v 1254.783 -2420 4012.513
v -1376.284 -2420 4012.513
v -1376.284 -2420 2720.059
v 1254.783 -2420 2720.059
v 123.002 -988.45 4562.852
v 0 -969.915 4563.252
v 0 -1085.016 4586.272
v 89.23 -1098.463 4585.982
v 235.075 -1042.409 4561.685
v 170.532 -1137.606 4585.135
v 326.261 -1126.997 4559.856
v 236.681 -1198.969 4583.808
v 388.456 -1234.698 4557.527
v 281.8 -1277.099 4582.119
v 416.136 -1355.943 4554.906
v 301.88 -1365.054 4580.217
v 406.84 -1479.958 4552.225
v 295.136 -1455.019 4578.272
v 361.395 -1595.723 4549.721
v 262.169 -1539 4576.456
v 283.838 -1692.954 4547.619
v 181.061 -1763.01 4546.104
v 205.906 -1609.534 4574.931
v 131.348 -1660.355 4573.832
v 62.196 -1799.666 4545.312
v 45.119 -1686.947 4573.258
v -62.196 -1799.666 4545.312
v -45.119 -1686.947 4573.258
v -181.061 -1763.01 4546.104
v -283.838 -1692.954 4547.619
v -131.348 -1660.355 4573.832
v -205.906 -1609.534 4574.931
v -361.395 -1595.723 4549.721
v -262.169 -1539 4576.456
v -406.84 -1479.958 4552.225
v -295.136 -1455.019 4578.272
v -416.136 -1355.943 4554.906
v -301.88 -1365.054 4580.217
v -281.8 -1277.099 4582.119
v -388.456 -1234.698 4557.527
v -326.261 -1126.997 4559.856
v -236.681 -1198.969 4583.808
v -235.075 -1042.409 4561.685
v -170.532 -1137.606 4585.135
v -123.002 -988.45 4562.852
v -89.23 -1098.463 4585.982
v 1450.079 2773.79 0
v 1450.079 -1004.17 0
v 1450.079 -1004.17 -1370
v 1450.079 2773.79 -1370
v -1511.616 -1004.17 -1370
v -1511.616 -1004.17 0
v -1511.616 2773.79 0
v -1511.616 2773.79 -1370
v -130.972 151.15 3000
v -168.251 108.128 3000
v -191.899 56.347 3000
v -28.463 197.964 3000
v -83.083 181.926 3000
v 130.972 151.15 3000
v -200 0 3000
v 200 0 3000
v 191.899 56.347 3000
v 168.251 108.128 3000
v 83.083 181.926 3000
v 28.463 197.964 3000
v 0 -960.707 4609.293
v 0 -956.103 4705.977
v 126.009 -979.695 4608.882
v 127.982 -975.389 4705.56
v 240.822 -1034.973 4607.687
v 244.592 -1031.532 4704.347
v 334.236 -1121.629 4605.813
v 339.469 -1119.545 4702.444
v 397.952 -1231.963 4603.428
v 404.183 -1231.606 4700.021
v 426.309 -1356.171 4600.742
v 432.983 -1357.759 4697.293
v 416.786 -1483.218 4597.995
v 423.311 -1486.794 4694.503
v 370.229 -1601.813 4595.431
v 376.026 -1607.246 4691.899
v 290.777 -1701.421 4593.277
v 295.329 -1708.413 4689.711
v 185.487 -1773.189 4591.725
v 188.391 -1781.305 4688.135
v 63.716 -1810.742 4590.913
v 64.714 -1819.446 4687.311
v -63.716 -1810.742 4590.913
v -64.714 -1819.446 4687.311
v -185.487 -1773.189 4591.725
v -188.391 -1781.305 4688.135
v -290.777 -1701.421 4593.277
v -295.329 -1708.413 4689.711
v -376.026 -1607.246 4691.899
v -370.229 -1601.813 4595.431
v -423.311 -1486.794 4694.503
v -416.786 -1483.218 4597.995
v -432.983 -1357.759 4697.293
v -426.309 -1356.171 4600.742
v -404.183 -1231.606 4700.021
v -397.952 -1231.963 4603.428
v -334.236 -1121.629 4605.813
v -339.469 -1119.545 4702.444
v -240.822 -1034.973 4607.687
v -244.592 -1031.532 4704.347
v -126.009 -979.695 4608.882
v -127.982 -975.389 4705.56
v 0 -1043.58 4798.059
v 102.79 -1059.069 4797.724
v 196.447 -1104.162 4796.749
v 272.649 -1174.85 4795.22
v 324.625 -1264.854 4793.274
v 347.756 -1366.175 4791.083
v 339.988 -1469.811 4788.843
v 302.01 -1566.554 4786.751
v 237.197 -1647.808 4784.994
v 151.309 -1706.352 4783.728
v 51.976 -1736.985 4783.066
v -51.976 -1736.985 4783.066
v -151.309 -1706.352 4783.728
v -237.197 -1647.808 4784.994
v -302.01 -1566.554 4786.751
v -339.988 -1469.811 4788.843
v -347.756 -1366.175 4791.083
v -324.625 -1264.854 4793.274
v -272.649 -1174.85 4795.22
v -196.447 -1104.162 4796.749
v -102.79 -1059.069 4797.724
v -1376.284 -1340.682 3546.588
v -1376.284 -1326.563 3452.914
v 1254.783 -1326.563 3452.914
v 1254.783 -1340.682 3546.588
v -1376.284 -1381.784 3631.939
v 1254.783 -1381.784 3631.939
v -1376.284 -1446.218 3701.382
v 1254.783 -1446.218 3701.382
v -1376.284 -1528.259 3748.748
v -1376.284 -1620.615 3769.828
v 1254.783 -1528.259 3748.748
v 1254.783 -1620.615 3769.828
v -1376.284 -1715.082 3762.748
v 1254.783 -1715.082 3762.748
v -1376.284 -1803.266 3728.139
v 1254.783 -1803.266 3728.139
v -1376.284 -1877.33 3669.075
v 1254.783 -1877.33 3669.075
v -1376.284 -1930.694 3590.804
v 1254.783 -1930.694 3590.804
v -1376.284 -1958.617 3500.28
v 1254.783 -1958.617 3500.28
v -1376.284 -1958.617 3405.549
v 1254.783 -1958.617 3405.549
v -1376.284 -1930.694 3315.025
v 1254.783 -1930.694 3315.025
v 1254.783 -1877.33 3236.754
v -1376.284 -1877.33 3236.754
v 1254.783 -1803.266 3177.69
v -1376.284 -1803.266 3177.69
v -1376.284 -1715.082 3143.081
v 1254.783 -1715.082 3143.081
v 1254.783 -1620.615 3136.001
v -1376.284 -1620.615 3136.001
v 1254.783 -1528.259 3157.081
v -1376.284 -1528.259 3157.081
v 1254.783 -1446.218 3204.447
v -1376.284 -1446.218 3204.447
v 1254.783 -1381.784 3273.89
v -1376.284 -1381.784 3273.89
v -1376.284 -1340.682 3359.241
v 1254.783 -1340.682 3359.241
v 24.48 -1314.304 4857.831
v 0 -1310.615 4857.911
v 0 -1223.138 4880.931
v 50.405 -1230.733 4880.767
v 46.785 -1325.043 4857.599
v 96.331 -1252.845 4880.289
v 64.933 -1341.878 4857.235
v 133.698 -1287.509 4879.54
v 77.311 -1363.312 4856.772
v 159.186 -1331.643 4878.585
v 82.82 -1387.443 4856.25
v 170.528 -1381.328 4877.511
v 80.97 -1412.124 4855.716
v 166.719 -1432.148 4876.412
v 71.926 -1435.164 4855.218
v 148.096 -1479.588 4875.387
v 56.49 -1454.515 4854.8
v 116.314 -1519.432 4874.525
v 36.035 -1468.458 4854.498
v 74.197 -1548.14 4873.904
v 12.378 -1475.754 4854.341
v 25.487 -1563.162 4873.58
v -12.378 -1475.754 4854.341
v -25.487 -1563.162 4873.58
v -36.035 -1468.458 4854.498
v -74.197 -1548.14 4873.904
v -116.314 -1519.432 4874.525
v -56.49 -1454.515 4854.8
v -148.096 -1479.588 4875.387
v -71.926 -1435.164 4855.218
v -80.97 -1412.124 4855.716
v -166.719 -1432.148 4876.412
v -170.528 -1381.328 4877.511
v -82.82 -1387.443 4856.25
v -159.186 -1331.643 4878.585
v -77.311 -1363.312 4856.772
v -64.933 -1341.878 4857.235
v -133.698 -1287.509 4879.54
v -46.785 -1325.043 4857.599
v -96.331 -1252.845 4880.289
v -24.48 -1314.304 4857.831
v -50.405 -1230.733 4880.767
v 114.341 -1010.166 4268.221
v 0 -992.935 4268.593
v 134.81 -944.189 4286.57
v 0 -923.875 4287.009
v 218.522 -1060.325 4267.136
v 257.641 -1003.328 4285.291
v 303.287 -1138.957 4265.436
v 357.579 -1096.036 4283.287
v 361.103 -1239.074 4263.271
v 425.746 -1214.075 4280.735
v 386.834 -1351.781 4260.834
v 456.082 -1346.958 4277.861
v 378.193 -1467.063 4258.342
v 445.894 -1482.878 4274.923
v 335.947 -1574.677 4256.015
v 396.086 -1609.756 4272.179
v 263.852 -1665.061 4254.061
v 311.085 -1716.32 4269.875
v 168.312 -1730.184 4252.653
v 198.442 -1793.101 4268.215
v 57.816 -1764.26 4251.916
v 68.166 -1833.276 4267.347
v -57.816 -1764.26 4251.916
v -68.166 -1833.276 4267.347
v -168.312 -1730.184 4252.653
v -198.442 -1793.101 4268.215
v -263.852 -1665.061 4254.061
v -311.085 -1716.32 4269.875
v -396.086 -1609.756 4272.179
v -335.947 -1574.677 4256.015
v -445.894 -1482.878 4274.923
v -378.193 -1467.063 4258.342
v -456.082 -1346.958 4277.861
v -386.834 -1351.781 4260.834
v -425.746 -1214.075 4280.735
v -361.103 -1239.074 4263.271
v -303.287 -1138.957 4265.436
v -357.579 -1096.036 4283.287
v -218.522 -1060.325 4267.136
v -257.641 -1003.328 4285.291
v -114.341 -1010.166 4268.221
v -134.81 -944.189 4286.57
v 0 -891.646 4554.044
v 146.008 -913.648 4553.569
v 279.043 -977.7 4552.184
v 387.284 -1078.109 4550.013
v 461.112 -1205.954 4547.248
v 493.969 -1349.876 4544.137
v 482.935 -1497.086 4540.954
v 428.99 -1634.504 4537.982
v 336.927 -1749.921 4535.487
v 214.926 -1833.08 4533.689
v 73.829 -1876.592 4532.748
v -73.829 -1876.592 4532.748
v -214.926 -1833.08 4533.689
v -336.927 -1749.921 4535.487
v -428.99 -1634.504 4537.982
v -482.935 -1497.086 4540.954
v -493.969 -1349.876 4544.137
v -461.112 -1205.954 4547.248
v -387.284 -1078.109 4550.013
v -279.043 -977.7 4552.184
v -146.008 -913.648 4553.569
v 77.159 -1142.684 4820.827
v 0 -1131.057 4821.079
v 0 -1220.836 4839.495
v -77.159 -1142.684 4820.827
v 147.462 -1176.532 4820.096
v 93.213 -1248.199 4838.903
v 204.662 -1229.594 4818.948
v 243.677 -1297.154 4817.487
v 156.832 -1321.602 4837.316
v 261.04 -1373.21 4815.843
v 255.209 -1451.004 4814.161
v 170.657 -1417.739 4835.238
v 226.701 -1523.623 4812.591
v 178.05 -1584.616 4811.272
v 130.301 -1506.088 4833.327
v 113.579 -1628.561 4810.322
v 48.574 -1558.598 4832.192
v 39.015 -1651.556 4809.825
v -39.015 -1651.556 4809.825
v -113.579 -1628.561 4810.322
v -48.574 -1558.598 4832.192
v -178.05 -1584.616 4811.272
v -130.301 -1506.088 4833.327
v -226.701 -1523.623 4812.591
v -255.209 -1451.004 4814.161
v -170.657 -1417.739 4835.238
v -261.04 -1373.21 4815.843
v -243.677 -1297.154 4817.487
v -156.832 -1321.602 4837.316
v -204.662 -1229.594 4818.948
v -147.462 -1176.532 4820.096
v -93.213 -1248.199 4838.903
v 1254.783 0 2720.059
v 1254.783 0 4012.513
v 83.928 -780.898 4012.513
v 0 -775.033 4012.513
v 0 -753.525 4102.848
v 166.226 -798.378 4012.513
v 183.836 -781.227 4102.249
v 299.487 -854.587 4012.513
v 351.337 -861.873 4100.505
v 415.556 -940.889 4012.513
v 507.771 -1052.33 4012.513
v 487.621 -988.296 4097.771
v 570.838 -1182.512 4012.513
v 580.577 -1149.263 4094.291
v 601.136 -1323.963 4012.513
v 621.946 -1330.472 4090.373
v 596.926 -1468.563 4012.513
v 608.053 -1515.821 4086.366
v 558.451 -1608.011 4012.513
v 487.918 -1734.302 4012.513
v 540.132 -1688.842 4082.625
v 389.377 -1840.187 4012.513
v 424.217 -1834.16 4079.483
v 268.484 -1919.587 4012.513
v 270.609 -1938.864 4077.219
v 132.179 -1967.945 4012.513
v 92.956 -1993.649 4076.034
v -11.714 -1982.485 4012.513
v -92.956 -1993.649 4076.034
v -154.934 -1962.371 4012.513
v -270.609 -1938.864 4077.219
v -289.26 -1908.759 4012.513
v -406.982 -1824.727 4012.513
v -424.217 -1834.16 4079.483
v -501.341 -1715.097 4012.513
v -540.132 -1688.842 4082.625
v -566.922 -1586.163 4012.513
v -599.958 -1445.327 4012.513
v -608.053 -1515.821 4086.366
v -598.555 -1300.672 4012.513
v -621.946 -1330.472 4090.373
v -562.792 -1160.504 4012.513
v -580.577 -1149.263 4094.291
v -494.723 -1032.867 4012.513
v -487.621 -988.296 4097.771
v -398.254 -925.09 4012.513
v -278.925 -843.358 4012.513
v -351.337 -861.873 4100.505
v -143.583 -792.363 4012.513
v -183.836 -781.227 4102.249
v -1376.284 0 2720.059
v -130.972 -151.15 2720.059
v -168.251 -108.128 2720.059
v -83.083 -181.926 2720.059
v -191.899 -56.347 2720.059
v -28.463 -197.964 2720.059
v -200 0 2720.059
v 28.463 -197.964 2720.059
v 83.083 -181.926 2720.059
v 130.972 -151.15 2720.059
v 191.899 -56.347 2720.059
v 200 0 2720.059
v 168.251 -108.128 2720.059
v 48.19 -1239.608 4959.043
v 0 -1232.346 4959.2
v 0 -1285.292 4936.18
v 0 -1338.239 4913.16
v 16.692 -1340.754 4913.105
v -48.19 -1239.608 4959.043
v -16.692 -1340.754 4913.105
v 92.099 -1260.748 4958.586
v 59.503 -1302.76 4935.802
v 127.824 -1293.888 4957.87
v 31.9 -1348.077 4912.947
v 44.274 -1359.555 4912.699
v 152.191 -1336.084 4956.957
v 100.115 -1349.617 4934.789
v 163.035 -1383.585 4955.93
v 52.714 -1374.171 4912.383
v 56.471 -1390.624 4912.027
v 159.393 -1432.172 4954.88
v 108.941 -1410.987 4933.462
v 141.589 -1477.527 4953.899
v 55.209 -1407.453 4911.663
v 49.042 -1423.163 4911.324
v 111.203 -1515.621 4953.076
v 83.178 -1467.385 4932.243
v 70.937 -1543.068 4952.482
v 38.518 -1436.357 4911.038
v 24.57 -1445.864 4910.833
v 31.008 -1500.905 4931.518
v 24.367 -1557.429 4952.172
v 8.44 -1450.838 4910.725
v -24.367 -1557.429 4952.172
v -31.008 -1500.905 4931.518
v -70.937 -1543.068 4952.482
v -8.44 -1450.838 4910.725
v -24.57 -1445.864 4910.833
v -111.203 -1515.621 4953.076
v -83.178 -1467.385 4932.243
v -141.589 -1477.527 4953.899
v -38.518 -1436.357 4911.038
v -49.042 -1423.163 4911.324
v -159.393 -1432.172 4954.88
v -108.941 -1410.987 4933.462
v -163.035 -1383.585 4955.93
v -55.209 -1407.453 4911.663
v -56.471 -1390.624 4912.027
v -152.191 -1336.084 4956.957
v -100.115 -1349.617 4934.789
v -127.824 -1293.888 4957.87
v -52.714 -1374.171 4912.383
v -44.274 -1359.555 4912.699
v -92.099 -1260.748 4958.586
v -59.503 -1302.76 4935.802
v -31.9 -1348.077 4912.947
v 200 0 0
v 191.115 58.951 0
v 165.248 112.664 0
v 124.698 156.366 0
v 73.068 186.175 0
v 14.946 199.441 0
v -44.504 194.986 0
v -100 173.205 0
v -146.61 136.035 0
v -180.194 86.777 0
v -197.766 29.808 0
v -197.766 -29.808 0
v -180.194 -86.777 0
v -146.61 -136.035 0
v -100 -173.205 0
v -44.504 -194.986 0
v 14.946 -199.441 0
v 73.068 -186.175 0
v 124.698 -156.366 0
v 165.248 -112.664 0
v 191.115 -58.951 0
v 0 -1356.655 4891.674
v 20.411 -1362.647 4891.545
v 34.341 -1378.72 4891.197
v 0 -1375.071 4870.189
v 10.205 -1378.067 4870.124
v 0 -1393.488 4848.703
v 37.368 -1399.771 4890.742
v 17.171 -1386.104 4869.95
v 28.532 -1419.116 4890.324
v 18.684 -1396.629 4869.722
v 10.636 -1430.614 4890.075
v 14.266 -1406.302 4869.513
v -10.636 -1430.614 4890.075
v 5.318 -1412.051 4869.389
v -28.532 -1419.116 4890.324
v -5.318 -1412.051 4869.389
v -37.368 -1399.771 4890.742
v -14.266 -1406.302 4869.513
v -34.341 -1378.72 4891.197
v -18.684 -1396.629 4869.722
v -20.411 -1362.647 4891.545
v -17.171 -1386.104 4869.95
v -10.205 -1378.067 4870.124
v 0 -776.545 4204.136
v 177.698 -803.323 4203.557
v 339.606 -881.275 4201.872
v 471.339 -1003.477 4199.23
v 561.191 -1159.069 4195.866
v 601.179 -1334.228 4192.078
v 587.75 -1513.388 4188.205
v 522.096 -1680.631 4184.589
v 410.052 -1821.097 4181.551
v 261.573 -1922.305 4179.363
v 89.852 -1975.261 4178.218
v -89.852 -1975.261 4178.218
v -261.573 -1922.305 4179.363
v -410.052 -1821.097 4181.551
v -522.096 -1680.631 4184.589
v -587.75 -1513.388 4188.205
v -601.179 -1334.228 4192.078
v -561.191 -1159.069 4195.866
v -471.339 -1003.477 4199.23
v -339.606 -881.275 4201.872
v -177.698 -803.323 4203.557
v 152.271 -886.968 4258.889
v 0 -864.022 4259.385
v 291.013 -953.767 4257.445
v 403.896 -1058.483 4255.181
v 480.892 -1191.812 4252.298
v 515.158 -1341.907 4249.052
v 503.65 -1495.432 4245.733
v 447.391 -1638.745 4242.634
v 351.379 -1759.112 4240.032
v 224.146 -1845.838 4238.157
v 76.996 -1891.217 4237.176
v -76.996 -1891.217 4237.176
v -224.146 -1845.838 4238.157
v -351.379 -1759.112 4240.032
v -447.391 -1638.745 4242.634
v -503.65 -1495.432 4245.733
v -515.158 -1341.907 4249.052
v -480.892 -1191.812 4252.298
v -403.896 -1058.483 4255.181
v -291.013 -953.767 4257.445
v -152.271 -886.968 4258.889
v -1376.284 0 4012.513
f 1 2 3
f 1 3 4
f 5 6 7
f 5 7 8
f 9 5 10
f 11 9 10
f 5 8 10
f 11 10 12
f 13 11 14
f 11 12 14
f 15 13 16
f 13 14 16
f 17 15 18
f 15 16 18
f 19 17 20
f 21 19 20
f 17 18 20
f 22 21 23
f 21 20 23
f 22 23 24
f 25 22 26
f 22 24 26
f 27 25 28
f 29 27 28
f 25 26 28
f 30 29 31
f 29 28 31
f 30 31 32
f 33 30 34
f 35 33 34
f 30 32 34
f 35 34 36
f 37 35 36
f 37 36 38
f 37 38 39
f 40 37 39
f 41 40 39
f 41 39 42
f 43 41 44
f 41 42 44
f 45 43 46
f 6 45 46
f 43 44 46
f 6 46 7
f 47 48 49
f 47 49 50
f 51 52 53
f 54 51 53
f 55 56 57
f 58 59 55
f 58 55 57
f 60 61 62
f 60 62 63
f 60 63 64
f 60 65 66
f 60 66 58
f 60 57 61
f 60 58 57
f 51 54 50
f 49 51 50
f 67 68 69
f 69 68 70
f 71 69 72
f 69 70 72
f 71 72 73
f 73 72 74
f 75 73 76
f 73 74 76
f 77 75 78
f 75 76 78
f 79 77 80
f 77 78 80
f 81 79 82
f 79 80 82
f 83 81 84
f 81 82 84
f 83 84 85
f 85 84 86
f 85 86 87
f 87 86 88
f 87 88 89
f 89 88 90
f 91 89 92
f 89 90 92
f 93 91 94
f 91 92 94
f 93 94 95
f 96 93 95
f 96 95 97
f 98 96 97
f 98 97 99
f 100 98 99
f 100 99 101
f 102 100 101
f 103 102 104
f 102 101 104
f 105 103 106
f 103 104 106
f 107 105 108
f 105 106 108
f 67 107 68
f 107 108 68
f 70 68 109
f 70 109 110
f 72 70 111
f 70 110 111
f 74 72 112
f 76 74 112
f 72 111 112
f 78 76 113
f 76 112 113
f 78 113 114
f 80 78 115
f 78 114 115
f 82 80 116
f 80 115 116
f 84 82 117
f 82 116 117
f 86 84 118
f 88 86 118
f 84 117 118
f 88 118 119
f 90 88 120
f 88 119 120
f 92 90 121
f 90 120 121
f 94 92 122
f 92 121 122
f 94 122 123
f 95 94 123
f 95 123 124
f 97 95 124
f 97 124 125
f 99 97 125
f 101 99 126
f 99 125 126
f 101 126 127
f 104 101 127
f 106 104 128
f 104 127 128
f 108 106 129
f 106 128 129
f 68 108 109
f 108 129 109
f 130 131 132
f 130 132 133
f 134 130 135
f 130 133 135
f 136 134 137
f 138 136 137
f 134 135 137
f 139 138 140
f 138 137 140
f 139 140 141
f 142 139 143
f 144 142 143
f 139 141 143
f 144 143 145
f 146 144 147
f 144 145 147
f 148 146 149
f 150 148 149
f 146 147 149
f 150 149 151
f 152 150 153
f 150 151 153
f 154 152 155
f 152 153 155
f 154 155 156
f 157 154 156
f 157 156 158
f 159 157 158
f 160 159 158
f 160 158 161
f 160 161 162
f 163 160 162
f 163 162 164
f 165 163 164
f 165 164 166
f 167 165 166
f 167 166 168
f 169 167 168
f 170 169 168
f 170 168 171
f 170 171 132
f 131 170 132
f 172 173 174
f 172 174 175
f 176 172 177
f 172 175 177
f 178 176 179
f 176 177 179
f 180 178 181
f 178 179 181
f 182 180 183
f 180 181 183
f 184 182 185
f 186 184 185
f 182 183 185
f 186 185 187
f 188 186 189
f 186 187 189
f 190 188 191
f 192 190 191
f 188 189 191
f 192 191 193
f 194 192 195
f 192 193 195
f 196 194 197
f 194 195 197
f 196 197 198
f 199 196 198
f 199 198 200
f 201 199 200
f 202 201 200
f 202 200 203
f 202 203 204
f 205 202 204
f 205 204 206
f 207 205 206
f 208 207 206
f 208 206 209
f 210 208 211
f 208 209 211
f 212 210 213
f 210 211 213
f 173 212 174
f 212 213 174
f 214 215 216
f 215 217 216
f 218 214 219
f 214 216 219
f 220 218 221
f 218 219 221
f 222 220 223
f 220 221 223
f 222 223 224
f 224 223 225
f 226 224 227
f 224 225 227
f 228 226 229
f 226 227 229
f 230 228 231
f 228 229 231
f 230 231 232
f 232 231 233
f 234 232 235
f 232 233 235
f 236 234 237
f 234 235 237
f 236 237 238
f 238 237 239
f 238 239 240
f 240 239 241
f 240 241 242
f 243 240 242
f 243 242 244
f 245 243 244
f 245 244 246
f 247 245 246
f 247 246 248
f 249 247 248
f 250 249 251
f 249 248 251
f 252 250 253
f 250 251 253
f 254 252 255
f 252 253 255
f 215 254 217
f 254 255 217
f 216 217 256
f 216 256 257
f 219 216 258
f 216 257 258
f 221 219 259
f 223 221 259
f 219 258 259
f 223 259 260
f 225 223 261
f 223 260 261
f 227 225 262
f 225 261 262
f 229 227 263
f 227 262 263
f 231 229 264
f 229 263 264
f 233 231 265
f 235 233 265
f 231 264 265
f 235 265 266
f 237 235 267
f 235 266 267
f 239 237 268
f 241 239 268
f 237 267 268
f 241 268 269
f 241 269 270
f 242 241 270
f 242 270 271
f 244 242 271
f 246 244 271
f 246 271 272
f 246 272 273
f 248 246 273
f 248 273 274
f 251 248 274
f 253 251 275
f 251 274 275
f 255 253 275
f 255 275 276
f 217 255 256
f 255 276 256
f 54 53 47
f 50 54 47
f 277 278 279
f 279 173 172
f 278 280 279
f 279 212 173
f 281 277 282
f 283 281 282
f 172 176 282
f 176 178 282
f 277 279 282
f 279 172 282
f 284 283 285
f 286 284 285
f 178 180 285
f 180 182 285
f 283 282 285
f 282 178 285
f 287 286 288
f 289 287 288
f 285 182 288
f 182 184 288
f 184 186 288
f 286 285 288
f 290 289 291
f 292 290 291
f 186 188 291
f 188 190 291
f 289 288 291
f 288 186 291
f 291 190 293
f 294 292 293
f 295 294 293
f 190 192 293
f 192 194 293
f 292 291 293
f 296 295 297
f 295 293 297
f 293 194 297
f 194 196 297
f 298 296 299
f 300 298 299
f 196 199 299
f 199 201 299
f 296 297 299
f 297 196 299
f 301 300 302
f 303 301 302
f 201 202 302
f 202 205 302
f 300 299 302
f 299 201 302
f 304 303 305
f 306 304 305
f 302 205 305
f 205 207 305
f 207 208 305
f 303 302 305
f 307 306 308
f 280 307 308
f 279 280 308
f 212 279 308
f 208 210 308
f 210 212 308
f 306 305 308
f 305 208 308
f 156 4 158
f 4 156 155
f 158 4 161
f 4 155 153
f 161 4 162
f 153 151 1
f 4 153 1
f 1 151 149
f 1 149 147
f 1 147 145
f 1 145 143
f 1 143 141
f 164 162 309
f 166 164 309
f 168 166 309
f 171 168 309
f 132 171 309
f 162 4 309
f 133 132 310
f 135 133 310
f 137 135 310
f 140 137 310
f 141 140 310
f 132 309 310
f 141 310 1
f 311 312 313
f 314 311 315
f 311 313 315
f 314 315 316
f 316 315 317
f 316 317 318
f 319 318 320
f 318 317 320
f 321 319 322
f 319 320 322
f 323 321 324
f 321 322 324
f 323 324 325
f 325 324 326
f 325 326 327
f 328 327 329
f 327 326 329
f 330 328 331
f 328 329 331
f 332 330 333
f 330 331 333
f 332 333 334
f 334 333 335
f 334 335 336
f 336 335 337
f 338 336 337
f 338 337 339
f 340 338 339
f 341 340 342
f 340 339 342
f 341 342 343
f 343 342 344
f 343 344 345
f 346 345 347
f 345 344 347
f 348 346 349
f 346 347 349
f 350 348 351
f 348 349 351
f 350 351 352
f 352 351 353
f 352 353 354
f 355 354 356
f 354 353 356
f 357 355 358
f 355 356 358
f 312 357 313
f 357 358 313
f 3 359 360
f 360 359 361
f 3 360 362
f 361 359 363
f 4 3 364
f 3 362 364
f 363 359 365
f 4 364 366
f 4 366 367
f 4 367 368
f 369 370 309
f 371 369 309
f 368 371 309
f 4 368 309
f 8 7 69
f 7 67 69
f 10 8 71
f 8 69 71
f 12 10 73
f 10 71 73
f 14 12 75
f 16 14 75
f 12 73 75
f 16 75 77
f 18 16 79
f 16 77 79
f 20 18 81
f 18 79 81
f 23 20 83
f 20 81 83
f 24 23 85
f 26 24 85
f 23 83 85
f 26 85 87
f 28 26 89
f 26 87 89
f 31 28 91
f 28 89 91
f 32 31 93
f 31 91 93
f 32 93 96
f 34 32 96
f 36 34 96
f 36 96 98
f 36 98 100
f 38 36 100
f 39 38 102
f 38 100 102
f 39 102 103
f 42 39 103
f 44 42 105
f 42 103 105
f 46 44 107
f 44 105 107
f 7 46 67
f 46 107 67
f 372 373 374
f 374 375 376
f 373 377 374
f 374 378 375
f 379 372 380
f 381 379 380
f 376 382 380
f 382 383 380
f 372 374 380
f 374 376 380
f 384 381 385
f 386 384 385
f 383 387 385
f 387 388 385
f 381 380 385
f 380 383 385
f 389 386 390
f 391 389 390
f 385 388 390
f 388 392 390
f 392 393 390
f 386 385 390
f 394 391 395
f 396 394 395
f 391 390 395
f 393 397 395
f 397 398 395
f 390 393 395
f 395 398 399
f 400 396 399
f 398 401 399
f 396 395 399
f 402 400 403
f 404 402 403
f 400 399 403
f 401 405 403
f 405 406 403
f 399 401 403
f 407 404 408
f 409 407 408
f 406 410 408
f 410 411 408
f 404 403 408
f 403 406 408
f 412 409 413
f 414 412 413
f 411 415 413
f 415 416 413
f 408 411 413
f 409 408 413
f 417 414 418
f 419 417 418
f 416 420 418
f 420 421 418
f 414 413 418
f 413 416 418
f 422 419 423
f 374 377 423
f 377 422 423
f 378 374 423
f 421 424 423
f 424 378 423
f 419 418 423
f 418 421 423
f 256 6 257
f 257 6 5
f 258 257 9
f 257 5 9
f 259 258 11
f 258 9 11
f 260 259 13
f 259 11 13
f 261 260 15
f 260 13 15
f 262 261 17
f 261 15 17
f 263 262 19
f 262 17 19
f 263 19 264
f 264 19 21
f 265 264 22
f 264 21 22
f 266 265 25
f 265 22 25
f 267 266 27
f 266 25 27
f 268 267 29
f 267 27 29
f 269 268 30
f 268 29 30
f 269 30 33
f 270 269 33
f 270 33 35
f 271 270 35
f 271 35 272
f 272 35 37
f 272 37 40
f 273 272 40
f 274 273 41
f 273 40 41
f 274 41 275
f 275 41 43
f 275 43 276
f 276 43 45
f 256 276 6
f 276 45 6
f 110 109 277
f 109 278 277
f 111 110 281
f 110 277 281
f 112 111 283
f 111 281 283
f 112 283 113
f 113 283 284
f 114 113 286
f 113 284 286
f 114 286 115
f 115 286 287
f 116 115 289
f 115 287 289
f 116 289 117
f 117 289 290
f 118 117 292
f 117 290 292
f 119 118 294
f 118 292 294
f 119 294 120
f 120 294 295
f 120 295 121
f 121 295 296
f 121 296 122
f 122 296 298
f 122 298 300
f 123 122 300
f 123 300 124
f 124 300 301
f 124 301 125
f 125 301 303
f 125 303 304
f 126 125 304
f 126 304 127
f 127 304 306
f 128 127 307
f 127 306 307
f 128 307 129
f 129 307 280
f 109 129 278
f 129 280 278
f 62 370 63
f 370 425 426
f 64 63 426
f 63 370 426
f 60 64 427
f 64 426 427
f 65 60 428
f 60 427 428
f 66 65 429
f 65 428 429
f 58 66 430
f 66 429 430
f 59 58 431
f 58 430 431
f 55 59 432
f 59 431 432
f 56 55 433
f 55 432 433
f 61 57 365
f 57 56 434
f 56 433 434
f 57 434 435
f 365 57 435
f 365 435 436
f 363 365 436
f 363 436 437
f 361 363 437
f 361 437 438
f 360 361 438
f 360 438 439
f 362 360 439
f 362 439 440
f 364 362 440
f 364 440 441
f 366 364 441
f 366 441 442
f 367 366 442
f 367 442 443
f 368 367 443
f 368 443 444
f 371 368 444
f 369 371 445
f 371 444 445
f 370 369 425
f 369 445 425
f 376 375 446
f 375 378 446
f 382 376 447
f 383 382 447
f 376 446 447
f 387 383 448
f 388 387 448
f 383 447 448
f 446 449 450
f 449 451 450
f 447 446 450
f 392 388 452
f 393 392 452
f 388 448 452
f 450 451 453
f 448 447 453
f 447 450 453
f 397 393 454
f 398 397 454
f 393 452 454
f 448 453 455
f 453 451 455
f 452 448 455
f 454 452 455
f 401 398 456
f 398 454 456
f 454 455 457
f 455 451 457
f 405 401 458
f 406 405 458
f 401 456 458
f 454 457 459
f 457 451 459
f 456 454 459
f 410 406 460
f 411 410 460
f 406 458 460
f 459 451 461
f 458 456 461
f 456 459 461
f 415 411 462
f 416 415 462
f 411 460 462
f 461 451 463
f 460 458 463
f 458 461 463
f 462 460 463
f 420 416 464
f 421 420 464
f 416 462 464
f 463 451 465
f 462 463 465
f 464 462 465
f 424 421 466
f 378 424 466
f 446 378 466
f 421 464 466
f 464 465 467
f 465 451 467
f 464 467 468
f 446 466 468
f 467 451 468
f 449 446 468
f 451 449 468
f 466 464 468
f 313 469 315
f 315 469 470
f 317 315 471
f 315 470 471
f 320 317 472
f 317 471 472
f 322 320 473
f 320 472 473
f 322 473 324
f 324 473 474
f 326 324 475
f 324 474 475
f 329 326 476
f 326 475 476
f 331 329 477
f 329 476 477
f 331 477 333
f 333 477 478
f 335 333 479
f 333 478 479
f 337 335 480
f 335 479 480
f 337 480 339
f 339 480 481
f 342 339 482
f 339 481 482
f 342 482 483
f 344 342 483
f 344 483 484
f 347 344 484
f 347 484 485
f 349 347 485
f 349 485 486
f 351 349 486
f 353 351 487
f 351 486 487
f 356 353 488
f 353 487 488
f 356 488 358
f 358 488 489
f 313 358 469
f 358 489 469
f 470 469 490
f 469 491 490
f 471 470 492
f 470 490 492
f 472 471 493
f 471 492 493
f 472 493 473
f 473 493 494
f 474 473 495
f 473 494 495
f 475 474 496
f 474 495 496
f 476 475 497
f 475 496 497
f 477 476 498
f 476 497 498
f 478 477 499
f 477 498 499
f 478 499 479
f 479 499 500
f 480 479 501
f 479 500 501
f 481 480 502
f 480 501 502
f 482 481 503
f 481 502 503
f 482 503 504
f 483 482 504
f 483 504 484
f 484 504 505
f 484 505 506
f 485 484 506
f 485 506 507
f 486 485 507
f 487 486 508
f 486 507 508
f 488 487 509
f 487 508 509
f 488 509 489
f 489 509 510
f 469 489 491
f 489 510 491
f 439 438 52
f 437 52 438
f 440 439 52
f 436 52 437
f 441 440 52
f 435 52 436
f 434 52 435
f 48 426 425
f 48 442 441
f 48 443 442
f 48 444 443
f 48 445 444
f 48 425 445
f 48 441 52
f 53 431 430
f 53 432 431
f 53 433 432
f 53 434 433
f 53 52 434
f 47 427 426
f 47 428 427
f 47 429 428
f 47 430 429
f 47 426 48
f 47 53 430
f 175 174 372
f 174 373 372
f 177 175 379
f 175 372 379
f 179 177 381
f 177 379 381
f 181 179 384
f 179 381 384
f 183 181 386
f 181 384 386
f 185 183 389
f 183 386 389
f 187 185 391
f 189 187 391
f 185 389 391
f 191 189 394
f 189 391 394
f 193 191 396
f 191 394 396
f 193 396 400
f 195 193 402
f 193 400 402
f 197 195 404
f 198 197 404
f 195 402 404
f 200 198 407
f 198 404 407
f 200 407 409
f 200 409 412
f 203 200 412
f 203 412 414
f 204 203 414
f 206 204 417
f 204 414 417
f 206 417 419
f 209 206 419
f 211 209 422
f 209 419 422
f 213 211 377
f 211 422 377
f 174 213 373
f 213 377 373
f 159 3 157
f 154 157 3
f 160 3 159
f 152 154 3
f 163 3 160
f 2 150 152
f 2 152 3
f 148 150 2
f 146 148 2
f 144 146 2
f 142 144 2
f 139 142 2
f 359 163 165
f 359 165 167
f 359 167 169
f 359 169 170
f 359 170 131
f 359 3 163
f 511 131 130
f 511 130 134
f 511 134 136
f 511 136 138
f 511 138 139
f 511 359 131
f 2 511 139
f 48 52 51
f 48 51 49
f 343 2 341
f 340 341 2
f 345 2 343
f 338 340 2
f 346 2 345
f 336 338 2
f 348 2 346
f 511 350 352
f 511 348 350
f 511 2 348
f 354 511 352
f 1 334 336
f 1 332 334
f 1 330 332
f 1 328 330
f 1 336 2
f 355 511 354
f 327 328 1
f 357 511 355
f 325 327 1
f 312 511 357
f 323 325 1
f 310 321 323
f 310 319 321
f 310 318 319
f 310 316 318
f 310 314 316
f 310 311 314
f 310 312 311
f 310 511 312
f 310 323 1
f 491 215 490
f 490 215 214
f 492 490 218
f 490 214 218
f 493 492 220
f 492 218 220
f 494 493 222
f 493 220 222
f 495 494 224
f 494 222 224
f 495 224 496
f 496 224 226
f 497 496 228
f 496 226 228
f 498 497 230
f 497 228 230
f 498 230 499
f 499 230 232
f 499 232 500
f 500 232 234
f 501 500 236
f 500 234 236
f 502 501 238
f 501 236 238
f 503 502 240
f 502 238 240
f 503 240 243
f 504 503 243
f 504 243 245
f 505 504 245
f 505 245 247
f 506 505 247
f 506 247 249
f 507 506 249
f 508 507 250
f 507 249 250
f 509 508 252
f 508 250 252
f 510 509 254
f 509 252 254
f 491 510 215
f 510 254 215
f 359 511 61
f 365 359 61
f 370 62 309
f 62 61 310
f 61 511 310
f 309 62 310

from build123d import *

# Parameters (mm, degrees)
F0_R     = 200
F1_DEPTH = 3000
F2_W     = 2631.0675144196
F2_H     = 1292.4540042877
F3_DEPTH = 2420
F4_W     = 2961.6948366165
F4_H     = 3777.9601812363
F5_DEPTH = 1370
F6_R     = 317.8019173966
F7_DEPTH = 3360


with BuildPart() as f1:
    # F0 (on Top) → F1 (new body)
    with BuildSketch(Plane.XY):
        Circle(F0_R)
    extrude(amount=F1_DEPTH)

    # F2 (on Front) → F3 (join)
    with BuildSketch(Plane.XZ):
        with Locations((-60.7503652573, 3366.2856817245)):
            Rectangle(F2_W, F2_H)
    extrude(amount=F3_DEPTH)

    # F4 (on Top) → F5 (join)
    with BuildSketch(Plane.XY):
        with Locations((-30.7685732841, 884.8100304604)):
            Rectangle(F4_W, F4_H)
    extrude(amount=-F5_DEPTH)

    # F6 (on face) → F7 (cut)
    with BuildSketch(Plane.YZ.offset(1254.7833919525)):
        with Locations((-1644.3647146225, 3452.9144763947)):
            Circle(F6_R)
    extrude(amount=-F7_DEPTH, mode=Mode.SUBTRACT)

    # F8 (on Right) → F9 (revolve)
    with BuildSketch(Plane.YZ):
        Polygon((-1393.48757267, 4848.7029075623), (-1375.0714063644, 3996.9544410706), (-778.7376543562, 3996.9544410706), (-753.525018692, 4102.8475761414), (-776.5452265739, 4204.1363716125), (-864.0221357346, 4259.3851089478), (-992.9354786873, 4268.5933113098), (-923.8747358322, 4287.0092391968), (-891.6463851929, 4554.0442466736), (-969.9152112007, 4563.2524490356), (-1085.0163698196, 4586.2722396851), (-960.7071280479, 4609.2925071716), (-956.1030864716, 4705.9774398804), (-1043.5799360275, 4798.0585098267), (-1131.0569047928, 4821.0787773132), (-1310.6147050858, 4857.9111099243), (-1223.1378555298, 4880.9313774109), (-1232.3459386826, 4959.2003822327), (-1338.2389545441, 4913.1598472595), align=None)
    revolve(axis=Axis((0, -1384.2794895172, 4422.8286743164), (0, 0.0216165497, -0.9997663351)))


solid = f1.part
